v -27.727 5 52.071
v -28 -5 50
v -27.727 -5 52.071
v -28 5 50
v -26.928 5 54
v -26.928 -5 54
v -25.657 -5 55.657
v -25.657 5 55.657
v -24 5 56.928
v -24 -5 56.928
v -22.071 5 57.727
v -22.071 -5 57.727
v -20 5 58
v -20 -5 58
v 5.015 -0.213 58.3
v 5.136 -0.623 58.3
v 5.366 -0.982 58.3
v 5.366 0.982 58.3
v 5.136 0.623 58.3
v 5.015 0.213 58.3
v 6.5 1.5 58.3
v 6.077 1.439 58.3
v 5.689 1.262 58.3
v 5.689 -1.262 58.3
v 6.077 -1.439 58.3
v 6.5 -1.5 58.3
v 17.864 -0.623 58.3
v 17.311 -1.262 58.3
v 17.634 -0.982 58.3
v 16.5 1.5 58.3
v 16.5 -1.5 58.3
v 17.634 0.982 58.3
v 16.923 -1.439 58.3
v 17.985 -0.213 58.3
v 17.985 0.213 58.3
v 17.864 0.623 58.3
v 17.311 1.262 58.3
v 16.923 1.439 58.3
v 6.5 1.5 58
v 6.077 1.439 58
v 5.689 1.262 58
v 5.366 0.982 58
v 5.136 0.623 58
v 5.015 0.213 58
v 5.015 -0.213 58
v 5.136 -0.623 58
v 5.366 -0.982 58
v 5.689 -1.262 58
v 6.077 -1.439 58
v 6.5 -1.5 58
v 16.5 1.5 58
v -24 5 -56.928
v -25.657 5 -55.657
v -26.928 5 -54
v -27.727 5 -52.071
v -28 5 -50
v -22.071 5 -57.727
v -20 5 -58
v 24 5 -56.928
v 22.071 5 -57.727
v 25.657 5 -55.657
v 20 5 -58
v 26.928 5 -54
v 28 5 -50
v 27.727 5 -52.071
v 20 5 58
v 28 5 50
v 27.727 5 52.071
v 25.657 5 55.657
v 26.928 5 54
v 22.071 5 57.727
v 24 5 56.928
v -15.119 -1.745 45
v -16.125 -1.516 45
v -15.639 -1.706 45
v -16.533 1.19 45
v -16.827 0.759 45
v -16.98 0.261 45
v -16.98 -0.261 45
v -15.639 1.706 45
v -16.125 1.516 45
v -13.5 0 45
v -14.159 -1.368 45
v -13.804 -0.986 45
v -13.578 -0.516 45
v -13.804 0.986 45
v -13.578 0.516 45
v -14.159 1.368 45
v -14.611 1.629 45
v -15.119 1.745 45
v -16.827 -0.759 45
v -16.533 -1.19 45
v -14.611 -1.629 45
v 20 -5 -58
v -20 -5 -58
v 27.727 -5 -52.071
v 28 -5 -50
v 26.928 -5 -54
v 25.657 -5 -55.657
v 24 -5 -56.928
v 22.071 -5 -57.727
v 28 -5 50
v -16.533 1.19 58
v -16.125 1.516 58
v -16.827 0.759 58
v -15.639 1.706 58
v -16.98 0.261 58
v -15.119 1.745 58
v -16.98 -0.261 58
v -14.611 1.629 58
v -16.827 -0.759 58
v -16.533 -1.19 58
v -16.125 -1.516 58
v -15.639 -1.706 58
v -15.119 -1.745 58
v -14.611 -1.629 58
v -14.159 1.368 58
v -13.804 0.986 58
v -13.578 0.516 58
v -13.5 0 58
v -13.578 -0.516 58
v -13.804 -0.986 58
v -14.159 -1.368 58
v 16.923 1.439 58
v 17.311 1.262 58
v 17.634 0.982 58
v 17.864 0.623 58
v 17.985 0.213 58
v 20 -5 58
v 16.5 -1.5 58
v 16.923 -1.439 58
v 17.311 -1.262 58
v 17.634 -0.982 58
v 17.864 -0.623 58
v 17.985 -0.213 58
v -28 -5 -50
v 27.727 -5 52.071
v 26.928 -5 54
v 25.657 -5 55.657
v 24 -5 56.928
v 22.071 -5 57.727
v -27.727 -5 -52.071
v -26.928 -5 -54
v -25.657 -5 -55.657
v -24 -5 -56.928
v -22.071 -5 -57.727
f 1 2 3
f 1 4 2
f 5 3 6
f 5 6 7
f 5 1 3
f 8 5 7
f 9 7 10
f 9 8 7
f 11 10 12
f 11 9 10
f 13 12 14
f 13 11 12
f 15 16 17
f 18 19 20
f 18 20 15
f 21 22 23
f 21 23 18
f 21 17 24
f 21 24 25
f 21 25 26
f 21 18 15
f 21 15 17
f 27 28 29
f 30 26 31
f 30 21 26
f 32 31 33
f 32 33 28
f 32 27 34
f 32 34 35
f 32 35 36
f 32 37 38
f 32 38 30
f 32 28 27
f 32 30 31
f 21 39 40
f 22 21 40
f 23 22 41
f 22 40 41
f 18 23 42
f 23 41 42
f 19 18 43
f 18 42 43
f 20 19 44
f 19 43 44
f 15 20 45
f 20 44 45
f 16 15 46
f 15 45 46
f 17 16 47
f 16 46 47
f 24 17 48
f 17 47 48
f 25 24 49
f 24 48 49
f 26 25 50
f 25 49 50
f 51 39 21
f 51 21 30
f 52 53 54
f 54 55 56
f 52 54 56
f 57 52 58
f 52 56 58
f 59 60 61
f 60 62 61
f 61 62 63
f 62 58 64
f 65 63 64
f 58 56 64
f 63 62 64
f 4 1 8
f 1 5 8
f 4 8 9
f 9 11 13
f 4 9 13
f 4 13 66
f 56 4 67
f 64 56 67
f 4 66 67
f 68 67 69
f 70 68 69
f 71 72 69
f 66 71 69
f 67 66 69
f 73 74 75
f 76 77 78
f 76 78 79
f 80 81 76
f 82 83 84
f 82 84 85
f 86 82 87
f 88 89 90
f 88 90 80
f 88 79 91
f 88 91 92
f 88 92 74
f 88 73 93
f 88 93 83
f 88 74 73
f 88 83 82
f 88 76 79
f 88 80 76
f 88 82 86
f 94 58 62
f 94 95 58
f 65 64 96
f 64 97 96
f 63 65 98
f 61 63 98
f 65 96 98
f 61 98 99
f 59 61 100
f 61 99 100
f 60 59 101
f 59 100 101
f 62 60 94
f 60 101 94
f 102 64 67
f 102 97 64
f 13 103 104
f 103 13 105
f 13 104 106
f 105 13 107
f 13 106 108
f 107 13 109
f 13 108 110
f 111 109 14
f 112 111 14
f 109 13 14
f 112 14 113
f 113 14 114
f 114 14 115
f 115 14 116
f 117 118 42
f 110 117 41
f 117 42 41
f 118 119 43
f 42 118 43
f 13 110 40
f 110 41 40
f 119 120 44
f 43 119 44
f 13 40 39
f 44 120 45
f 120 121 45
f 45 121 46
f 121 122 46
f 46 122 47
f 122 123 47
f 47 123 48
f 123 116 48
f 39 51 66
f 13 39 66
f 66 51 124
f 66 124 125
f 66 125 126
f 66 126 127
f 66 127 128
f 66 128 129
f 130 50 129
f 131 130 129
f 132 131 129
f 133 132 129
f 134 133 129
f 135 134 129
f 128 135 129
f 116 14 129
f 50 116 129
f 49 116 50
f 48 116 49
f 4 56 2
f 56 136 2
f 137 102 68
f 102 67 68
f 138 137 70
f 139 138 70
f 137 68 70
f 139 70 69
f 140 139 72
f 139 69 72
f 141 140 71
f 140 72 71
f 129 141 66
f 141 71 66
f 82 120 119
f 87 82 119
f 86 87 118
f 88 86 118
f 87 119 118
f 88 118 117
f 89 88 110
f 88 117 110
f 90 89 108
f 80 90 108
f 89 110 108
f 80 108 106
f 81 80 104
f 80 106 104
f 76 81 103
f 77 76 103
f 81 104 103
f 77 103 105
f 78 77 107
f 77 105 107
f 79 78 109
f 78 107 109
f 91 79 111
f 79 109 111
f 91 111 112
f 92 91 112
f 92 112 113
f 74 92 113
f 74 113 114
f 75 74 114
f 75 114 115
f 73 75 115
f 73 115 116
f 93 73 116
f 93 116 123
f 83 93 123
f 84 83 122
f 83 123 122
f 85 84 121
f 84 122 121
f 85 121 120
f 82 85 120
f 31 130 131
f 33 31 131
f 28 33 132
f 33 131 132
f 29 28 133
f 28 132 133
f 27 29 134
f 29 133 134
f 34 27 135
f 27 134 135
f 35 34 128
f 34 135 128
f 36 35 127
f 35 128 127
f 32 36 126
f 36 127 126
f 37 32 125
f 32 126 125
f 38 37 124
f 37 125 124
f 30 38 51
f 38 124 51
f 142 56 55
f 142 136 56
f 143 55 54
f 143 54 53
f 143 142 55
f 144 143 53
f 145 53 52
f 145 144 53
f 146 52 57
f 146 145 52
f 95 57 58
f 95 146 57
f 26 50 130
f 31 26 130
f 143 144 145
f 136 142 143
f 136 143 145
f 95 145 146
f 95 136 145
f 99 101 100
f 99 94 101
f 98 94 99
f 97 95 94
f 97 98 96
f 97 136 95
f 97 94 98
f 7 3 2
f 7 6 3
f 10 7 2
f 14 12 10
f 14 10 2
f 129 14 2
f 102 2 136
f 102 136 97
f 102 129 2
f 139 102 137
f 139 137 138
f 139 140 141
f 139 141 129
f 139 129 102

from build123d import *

# Parameters (mm, degrees)
F0_W     = 56
F0_H     = 116
F1_DEPTH = 5
F2_R     = 8
F3_R     = 1.75
F4_DEPTH = 13
F5_W     = 9.9999913867
F5_H     = 3
F6_DEPTH = 0.3


with BuildPart() as f1:
    # F0 (on Front) → F1 (new body, symmetric)
    with BuildSketch(Plane.XZ):
        Rectangle(F0_W, F0_H)
    extrude(amount=F1_DEPTH, both=True)

    # F2
    f2_edges = [f1.edges().sort_by_distance(p)[0] for p in [
        (-28, 0, 58),
        (28, 0, 58),
        (28, 0, -58),
        (-28, 0, -58),
    ]]
    fillet(f2_edges, radius=F2_R)

    # F3 (on face) → F4 (cut)
    with BuildSketch(Plane.XY.offset(58)):
        with Locations((-15.25, 0)):
            Circle(F3_R)
    extrude(amount=-F4_DEPTH, mode=Mode.SUBTRACT)

    # F5 (on face) → F6 (join)
    with BuildSketch(Plane.XY.offset(58)):
        with Locations((11.5000043066, 0)):
            Rectangle(F5_W, F5_H)
        with BuildLine():
            Line((6.5000086133, -1.5), (6.5000086133, 1.5))
            ThreePointArc((6.5000086133, 1.5), (5.0000086133, 0), (6.5000086133, -1.5))
        make_face()
        with BuildLine():
            ThreePointArc((16.5, -1.5), (18, 0), (16.5, 1.5))
            Line((16.5, 1.5), (16.5, -1.5))
        make_face()
    extrude(amount=F6_DEPTH)


solid = f1.part
